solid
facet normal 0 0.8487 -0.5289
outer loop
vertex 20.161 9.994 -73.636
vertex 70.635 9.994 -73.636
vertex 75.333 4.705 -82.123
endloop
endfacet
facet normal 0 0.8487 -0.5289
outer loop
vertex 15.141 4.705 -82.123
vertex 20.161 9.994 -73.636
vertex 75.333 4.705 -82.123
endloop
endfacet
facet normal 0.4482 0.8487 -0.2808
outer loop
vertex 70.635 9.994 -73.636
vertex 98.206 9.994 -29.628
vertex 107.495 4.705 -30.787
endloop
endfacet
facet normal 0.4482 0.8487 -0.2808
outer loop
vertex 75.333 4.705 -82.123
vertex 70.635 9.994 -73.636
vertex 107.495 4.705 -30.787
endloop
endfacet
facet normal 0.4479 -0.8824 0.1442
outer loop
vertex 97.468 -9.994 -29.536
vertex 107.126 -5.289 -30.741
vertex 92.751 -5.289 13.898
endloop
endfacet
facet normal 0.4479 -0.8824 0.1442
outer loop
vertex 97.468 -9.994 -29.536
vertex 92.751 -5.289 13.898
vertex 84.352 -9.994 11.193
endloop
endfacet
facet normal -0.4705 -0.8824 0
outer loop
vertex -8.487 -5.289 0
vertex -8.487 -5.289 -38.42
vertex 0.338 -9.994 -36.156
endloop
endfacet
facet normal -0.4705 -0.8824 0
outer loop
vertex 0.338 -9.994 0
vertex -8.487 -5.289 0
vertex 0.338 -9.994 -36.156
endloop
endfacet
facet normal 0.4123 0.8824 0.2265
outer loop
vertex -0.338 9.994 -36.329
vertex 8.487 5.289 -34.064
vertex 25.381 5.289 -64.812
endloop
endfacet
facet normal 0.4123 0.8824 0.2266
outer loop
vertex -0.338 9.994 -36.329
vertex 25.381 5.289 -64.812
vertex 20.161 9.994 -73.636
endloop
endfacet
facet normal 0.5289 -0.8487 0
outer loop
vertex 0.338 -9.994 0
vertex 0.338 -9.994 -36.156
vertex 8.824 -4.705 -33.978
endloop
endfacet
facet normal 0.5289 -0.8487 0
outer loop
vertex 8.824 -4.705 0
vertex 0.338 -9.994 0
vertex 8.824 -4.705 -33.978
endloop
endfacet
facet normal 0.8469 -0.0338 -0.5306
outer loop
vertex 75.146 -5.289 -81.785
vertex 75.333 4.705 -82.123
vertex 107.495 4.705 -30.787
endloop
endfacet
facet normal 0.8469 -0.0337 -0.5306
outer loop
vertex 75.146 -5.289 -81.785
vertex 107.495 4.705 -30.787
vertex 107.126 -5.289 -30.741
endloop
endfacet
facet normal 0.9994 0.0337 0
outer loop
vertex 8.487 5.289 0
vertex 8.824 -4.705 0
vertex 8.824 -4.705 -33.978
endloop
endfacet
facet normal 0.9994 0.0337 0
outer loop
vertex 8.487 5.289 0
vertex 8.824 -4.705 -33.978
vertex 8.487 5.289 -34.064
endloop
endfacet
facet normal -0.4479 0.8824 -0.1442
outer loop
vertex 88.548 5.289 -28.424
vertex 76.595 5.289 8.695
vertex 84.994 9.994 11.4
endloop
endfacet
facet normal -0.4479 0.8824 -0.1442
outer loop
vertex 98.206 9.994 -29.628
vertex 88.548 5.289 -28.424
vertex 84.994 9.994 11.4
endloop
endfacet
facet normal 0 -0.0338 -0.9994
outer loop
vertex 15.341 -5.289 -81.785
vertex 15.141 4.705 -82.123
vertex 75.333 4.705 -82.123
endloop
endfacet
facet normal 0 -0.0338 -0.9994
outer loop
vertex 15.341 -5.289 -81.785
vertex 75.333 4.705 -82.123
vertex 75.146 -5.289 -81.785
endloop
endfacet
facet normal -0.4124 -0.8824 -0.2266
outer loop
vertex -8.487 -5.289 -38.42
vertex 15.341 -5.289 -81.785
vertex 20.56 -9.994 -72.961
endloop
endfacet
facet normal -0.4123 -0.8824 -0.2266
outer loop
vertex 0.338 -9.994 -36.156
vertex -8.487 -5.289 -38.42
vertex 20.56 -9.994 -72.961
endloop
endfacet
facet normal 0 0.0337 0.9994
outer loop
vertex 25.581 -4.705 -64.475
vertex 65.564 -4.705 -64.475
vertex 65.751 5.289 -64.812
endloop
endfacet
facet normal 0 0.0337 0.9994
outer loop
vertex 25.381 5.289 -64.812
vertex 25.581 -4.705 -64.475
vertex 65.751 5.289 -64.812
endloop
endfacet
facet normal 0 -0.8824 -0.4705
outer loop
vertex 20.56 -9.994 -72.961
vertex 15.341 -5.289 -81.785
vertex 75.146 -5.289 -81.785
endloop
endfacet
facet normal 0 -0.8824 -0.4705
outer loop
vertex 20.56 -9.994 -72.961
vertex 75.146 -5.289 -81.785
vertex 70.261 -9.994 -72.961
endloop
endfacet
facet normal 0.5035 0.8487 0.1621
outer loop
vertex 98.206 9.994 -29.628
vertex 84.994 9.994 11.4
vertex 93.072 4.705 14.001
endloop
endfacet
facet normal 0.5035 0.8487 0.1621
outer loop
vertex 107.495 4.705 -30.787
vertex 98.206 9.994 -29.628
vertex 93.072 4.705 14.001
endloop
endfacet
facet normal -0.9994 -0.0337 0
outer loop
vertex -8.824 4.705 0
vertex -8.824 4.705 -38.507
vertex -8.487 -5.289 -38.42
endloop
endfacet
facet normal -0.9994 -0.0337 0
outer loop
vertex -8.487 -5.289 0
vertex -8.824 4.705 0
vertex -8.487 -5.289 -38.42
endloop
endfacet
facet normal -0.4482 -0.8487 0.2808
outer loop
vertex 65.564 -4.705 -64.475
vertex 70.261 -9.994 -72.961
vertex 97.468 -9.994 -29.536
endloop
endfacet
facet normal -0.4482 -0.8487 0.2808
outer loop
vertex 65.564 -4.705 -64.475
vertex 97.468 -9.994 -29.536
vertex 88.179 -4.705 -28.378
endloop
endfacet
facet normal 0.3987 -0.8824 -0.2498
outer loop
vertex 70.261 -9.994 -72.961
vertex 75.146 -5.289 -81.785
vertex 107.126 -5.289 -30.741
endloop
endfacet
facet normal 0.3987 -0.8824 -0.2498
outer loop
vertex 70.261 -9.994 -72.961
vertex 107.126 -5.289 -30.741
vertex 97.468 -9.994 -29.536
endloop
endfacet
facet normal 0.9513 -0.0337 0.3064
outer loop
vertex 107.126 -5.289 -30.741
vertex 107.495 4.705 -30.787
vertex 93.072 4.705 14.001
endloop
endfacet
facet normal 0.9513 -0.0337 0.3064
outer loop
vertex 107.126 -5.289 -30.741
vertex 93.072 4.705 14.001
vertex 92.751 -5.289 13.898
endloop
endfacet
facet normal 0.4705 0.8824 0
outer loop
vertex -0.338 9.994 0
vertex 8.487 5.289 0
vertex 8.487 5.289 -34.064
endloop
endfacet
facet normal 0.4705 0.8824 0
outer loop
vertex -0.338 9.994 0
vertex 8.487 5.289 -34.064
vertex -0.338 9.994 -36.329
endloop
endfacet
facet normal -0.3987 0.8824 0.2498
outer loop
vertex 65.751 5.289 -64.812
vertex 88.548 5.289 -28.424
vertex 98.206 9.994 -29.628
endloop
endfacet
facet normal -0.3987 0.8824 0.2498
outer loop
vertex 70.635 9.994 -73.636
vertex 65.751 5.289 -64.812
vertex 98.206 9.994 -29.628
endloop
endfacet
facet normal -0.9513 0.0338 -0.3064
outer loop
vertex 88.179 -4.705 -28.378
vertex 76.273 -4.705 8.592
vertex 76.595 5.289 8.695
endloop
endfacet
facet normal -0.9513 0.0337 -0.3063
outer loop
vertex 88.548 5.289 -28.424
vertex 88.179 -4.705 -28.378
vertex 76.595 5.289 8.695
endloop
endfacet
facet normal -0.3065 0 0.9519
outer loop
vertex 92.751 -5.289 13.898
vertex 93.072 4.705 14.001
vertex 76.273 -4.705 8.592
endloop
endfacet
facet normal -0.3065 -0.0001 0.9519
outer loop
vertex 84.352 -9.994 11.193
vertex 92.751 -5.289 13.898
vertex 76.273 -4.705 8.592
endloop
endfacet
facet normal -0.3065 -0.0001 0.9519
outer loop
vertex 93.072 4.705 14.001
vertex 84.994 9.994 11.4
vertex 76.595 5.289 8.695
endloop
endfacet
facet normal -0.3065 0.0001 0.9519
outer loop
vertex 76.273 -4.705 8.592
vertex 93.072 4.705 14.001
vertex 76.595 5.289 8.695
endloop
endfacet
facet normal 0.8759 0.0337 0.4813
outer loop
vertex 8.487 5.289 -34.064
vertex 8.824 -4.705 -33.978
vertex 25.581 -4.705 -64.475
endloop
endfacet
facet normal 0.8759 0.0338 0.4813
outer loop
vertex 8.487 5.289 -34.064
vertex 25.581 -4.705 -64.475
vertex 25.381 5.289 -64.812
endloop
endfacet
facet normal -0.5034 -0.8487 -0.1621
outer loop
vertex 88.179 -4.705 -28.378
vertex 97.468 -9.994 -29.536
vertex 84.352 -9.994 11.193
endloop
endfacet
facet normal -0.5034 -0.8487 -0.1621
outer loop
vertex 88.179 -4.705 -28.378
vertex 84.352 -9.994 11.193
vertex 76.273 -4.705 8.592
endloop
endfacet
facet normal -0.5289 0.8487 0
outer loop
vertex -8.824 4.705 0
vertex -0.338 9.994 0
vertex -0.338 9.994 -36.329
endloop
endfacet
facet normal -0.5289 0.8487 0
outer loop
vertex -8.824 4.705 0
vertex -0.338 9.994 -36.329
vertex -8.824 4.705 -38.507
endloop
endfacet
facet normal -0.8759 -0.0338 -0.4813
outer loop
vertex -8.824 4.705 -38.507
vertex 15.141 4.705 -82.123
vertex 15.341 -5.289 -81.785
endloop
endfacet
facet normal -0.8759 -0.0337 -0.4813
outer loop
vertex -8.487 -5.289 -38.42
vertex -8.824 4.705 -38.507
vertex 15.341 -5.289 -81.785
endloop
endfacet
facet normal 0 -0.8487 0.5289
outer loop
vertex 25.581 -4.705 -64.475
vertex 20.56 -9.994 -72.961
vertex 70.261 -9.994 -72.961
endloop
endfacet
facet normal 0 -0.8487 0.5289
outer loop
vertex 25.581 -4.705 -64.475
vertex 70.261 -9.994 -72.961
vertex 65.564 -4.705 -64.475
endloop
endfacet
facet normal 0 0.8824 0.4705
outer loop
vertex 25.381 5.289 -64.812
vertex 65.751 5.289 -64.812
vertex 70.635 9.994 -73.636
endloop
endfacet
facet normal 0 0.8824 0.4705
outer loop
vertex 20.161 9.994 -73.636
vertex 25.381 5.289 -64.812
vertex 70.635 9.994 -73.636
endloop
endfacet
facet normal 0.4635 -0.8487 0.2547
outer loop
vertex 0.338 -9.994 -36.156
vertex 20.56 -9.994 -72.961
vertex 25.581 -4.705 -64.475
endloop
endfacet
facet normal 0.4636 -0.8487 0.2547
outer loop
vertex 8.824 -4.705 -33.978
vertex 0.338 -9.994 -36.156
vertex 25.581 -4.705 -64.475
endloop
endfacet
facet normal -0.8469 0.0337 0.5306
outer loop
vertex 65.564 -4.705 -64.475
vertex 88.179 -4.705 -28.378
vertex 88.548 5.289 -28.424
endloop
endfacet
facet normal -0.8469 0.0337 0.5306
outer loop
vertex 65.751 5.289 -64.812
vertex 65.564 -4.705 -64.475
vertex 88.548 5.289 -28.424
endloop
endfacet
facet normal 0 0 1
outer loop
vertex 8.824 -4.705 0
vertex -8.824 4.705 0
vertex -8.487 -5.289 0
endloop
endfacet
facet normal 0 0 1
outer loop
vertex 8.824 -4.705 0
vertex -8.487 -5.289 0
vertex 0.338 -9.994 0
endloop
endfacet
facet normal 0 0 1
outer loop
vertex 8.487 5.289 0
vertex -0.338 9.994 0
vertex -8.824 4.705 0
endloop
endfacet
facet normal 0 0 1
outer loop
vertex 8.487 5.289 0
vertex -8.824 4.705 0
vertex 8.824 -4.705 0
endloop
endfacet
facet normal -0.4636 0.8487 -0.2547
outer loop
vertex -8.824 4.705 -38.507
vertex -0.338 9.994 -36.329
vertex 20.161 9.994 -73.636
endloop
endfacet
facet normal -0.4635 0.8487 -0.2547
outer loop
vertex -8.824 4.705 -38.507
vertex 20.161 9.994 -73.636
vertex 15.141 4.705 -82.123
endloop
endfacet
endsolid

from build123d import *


with BuildPart() as part:
    # Sweep2: sweep along a path in Sketch3
    with BuildLine(Plane(origin=(0, 0, 0), x_dir=(1, 0, 0), z_dir=(0, 1, 0))) as sweep2_path:
        Line((0, 0), (0, 36.242190507))
        Line((0, 36.242190507), (20.360781184, 73.298812262))
        Line((20.360781184, 73.298812262), (70.448302897, 73.298812262))
        Line((70.448302897, 73.298812262), (97.837038373, 29.582176791))
        Line((97.837038373, 29.582176791), (84.672762234, -11.296364903))
    # Sketch1 → Sweep2 (sweep)
    with BuildSketch(Plane.XY):
        Polygon((8.824071359, -4.70486606), (8.486569209, 5.289436932), (-0.33750215, 9.994302992), (-8.824071359, 4.70486606), (-8.486569209, -5.289436932), (0.33750215, -9.994302992), align=None)
    sweep(path=sweep2_path.line, transition=Transition.RIGHT)


solid = part.part
